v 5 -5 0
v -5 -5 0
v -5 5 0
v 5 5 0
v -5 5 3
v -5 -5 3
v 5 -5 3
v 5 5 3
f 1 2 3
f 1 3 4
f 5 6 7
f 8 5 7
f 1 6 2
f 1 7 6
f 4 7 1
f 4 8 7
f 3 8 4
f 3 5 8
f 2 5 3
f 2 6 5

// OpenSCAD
module glass() {
    color("white")
    linear_extrude(3)
    square(10, center = true);
}

glass();
